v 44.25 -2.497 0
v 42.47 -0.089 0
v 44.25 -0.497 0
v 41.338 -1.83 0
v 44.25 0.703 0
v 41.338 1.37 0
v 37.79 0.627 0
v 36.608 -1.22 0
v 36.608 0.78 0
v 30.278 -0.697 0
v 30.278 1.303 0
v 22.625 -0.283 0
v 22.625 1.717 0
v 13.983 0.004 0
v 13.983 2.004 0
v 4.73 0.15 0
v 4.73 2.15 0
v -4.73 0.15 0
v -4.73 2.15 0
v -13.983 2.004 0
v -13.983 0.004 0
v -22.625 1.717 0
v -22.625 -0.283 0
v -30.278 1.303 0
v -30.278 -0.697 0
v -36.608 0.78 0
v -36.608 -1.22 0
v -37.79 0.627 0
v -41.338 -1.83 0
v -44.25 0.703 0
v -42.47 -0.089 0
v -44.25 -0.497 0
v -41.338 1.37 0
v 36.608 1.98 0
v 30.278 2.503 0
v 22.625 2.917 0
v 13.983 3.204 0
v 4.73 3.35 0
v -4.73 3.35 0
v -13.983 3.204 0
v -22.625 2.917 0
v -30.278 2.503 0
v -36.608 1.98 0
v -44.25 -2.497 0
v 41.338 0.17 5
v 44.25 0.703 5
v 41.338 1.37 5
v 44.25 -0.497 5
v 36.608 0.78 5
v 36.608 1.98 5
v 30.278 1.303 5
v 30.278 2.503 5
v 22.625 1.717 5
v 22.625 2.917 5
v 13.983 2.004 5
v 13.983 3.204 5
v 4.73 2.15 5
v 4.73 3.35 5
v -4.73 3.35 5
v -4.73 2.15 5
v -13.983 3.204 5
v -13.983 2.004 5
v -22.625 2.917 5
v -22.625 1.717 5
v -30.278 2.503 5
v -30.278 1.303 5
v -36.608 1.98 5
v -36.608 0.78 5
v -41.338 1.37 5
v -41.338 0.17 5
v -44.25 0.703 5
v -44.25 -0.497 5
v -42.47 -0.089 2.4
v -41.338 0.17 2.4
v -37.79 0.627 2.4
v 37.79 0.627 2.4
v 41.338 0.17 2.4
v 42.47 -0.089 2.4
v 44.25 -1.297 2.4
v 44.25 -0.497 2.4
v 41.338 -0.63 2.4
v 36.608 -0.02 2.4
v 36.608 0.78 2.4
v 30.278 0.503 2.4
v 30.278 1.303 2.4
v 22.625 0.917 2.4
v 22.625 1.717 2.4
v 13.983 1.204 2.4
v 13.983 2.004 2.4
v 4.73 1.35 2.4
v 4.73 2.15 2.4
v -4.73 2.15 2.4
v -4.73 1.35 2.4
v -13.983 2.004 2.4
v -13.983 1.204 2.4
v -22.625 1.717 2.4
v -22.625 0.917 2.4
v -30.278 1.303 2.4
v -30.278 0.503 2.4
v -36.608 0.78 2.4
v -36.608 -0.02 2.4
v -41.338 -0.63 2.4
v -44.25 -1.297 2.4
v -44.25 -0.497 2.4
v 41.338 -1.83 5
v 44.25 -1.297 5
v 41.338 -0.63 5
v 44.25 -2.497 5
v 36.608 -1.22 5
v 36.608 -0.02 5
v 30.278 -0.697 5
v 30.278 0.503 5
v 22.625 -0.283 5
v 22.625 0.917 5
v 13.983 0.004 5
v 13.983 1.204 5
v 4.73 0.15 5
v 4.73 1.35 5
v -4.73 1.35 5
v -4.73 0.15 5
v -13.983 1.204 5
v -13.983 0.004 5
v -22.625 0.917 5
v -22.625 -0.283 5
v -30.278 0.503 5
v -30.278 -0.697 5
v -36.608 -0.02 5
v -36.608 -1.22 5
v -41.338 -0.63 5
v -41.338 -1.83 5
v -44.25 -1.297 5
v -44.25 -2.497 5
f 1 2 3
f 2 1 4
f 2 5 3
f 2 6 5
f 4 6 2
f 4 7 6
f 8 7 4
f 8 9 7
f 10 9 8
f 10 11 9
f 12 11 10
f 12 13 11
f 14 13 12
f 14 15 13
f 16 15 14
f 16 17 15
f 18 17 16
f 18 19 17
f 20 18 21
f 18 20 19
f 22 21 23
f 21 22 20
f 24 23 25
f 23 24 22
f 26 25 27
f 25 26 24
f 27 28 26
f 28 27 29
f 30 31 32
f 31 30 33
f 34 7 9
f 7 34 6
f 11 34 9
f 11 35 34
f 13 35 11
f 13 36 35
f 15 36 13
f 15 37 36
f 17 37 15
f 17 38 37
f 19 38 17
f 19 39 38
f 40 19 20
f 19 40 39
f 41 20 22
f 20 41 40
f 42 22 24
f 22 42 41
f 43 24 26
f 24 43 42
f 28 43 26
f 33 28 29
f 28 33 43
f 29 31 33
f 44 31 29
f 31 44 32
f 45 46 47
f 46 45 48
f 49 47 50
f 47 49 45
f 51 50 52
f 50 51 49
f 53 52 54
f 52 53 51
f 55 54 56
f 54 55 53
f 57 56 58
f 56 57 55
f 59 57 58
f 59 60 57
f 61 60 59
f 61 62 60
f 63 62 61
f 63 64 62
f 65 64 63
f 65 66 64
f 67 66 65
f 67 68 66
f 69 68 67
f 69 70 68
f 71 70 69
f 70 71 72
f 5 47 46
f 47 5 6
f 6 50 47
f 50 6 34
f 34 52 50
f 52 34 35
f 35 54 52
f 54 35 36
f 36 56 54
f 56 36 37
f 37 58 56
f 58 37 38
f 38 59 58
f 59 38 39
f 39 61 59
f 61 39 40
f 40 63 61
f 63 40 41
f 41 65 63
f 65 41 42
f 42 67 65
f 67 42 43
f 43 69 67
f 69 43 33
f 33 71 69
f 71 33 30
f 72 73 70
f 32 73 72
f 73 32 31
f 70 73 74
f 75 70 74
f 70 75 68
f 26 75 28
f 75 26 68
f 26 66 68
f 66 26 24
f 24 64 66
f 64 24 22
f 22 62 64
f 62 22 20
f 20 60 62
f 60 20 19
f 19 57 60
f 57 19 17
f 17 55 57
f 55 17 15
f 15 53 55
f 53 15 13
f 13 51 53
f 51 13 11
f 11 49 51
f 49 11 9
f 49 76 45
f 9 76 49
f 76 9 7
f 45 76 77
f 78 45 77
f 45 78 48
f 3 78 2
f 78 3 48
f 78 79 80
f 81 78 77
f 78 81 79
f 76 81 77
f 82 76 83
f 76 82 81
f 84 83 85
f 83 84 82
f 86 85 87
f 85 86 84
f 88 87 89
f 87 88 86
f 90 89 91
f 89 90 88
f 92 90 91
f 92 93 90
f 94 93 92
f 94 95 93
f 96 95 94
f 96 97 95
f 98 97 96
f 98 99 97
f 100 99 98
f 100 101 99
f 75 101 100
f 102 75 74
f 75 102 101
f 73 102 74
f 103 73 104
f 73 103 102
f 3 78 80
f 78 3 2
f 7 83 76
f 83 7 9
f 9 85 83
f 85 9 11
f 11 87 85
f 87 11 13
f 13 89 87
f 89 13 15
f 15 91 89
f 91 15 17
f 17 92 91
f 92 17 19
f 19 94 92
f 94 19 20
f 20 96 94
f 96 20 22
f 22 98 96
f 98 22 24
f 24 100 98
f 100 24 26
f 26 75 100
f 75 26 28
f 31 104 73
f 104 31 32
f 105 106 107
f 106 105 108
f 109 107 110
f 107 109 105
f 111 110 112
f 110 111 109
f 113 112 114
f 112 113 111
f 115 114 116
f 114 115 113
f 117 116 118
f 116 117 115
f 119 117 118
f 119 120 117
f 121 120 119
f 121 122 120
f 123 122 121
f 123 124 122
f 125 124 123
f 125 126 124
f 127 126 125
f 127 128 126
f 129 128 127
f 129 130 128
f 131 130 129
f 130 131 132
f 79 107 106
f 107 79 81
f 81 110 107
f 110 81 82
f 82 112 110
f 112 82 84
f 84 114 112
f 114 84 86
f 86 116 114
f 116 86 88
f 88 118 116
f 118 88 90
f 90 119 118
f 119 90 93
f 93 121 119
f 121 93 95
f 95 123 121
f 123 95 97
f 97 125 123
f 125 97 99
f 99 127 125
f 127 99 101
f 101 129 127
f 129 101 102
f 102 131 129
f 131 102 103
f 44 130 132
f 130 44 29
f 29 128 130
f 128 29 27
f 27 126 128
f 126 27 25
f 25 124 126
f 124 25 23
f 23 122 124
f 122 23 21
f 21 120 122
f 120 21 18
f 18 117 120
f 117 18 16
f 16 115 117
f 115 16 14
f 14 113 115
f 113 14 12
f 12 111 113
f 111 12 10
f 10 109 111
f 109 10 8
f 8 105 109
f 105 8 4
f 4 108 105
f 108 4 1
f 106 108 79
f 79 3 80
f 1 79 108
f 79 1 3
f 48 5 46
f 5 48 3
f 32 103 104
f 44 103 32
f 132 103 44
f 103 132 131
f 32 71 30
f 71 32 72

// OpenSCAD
w_x = 90.5;
w_y = 6.7;
s_wall = 1.2;
h_wall = 5; //50;
s_gap = 0.8;

module ellipse(w_x, w_y) {
    resize([w_x, w_y])
        circle(d = w_x);
}

module arc(w_x, w_y, s_wall) {
    difference() {
        ellipse(w_x, w_y);
        translate([0, -s_wall, 0])
            ellipse(w_x, w_y);
    }
}

module arc_height(w_x, w_y, s_wall, h_wall) {
    linear_extrude(height = h_wall) 
        arc(w_x, w_y, s_wall);
}

difference() {
    union() {
        arc_height(w_x, w_y, s_wall, h_wall);

        translate([0, -s_wall, 0])
            arc_height(w_x, w_y, s_wall, 2.4);

        translate([0, -s_wall - s_gap, 0])
            arc_height(w_x, w_y, s_wall, h_wall);
    }
    
    translate([w_x / 2 - 1, -w_y / 2, -1])
        cube([2, 2 * s_wall + s_gap + 2, h_wall + 2]);
    
    translate([-w_x / 2 - 1, -w_y / 2, -1])
        cube([2, 2 * s_wall + s_gap + 2, h_wall + 2]);    
}
